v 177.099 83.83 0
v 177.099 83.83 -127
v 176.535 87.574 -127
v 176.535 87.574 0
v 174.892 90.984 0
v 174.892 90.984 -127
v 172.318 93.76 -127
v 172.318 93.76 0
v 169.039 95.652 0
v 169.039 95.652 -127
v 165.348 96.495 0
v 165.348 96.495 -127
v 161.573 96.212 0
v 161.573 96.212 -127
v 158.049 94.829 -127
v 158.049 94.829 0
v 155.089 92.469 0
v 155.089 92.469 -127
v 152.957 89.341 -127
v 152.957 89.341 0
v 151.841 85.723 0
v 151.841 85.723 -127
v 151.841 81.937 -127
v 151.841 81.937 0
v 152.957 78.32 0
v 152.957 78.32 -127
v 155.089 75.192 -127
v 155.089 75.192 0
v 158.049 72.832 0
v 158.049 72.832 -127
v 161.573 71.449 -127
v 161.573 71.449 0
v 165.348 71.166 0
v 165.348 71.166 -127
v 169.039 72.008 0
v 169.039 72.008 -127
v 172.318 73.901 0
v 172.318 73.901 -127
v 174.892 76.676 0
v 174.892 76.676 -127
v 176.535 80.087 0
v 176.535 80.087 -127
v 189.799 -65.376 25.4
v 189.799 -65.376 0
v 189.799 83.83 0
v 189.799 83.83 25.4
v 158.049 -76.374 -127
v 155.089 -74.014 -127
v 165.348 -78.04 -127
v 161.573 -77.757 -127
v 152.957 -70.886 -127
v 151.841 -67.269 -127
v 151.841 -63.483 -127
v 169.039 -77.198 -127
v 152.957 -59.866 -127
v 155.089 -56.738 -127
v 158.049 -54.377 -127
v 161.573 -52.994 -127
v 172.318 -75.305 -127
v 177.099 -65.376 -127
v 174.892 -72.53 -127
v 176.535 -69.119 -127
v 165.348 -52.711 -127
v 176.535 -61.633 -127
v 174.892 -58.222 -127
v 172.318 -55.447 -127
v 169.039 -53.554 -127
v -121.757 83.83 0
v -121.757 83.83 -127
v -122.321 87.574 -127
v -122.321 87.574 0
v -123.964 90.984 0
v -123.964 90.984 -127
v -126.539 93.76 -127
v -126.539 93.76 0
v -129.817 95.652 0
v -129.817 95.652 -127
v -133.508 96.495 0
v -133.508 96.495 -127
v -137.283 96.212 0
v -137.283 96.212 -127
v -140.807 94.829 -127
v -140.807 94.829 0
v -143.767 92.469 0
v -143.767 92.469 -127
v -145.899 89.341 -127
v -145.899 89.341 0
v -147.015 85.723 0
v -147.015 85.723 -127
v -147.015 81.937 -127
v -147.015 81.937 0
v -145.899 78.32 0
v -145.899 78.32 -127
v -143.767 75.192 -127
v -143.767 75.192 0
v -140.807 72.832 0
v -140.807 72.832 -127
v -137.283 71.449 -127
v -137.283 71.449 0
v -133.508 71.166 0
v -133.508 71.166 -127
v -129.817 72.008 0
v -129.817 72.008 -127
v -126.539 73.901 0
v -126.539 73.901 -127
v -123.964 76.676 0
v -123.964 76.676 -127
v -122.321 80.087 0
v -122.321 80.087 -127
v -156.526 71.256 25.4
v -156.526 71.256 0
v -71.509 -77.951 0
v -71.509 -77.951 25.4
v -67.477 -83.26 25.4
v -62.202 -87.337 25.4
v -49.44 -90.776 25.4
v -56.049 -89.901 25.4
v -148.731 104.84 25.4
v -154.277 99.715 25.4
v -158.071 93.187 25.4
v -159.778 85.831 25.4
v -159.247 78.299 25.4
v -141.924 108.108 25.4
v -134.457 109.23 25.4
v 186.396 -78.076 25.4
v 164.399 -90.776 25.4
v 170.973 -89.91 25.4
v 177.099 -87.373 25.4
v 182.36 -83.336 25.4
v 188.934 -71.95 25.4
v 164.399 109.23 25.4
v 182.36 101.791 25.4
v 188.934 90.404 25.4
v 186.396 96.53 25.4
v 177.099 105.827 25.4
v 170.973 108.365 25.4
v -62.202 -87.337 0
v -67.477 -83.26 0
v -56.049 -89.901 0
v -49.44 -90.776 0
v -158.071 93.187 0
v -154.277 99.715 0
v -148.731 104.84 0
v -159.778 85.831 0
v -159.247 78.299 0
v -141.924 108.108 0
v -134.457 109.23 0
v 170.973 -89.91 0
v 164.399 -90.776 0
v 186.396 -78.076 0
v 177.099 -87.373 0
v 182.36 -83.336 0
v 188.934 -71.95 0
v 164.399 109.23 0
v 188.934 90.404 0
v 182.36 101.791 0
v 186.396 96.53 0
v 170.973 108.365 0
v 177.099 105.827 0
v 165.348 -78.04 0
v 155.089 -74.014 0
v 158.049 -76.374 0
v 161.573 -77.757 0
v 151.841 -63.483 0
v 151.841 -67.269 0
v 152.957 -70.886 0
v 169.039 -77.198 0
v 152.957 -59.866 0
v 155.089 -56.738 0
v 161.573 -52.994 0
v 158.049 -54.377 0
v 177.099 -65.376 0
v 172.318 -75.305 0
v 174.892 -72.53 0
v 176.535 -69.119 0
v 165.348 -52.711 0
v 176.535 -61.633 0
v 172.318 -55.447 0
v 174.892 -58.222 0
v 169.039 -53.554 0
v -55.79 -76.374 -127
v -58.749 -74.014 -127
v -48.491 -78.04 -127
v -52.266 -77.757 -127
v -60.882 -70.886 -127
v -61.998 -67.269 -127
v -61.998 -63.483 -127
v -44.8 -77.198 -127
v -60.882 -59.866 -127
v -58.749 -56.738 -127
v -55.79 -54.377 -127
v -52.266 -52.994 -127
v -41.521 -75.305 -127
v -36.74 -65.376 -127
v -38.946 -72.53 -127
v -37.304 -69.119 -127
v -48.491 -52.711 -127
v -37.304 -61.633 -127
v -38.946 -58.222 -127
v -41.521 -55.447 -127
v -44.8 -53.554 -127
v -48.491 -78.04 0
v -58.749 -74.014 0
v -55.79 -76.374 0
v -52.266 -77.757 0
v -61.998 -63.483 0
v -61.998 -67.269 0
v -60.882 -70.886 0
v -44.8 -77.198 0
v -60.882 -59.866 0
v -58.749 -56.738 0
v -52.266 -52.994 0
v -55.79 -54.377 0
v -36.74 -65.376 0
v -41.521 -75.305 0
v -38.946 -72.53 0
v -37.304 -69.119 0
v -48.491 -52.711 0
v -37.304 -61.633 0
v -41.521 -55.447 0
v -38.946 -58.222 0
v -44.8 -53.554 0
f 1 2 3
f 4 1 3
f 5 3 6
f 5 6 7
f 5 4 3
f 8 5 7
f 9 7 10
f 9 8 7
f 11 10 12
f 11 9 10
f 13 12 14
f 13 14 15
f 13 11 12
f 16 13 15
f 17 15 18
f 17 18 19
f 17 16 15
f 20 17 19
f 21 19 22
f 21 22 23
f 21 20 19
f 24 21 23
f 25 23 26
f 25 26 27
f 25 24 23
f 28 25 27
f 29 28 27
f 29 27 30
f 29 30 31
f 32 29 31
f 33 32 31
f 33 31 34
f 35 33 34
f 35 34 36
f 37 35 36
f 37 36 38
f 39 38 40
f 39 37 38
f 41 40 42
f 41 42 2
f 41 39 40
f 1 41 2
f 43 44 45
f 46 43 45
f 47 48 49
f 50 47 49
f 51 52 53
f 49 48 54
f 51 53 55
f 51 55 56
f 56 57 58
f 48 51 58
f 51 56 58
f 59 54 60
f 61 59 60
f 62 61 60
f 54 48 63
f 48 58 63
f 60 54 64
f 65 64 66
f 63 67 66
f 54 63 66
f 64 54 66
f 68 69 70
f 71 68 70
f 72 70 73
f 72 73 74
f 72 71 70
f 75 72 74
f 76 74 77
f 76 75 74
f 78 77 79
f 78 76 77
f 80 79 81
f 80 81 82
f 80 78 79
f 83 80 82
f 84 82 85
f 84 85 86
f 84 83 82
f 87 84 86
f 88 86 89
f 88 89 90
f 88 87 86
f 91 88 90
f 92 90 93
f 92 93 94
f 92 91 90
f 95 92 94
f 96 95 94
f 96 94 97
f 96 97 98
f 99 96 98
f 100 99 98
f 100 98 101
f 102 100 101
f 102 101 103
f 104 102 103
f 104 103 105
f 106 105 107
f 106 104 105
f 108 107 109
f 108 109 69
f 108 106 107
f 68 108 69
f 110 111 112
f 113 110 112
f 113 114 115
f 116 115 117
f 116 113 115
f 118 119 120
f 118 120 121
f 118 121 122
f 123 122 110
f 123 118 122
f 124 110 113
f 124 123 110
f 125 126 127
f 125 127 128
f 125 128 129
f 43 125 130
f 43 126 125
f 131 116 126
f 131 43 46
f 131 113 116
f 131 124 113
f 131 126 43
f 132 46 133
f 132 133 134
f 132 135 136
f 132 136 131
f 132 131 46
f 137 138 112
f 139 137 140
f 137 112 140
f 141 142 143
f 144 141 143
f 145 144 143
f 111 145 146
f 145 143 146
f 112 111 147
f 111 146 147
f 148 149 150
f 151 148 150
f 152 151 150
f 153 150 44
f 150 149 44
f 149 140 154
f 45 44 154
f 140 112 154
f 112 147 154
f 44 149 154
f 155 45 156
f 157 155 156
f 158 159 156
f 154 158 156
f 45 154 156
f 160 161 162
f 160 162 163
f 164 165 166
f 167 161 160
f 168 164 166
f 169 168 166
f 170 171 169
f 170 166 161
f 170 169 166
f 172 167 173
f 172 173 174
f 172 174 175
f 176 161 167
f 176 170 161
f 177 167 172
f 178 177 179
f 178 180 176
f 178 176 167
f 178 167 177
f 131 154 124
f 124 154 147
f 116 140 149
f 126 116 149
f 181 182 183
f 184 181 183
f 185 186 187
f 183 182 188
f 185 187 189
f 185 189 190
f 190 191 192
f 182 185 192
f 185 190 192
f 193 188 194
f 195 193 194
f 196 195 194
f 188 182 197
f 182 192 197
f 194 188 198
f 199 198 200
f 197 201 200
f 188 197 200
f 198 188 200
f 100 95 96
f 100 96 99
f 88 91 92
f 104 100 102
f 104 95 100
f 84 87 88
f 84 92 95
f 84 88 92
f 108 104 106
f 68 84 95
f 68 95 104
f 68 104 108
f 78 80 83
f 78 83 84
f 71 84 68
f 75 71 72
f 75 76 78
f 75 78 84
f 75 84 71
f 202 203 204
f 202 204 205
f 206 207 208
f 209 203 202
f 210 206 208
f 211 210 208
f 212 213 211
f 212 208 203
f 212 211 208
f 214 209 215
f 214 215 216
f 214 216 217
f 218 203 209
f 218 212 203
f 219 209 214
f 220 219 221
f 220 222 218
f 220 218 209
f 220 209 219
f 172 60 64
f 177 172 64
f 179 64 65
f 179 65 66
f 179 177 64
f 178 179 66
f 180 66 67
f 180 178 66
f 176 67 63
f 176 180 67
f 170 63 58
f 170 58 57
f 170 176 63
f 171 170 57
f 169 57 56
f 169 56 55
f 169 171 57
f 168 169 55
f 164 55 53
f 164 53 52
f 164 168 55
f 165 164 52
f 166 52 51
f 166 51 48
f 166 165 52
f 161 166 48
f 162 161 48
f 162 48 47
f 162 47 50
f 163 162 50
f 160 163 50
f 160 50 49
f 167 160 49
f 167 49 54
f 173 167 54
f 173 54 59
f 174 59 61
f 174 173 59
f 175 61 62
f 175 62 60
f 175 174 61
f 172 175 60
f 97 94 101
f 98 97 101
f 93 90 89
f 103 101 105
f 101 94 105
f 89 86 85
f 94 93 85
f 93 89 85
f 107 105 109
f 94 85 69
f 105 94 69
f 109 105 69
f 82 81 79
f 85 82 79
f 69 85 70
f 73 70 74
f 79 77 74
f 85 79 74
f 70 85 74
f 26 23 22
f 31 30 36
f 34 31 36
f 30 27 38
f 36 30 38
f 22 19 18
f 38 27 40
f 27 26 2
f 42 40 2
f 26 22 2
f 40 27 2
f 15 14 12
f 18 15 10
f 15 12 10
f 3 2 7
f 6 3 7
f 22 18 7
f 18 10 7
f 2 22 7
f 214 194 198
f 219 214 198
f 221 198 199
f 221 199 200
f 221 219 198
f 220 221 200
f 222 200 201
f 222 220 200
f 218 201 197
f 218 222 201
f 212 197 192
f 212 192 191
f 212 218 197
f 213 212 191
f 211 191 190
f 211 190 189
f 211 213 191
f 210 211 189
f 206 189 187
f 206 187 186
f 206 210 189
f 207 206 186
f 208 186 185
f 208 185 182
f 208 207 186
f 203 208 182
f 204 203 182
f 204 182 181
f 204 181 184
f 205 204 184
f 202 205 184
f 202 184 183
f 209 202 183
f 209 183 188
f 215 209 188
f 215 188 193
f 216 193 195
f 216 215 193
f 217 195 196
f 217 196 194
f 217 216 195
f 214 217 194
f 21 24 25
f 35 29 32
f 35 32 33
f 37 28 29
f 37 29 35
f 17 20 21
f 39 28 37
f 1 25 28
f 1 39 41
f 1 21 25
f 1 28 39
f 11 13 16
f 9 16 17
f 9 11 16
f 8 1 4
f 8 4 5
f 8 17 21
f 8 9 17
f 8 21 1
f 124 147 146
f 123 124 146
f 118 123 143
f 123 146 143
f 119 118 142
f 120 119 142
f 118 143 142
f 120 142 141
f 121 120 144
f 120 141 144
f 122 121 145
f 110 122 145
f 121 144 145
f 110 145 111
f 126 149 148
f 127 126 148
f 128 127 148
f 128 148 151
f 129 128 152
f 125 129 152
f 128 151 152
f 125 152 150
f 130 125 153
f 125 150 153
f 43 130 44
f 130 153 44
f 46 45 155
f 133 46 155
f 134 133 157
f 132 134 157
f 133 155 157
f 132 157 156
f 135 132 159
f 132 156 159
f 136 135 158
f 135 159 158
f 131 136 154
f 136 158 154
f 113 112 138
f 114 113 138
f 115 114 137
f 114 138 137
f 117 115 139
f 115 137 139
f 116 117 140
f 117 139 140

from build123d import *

# Parameters (mm, degrees)
F0_R     = 12.7
F1_DEPTH = 127
F2_DEPTH = 127
F3_DEPTH = 127
F4_DEPTH = 127
F5_DEPTH = 25.4


with BuildPart() as f1:
    # F0 (on Top) → F1 (new body)
    with BuildSketch(Plane.XY):
        with Locations((-134.45683, 83.830311)):
            Circle(F0_R)
    extrude(amount=-F1_DEPTH)


with BuildPart() as f2:
    # F0 (on Top) → F2 (new body)
    with BuildSketch(Plane.XY):
        with Locations((-49.43966, -65.375908)):
            Circle(F0_R)
    extrude(amount=-F2_DEPTH)


with BuildPart() as f3:
    # F0 (on Top) → F3 (new body)
    with BuildSketch(Plane.XY):
        with Locations((164.399237, -65.375908)):
            Circle(F0_R)
    extrude(amount=-F3_DEPTH)


with BuildPart() as f4:
    # F0 (on Top) → F4 (new body)
    with BuildSketch(Plane.XY):
        with Locations((164.399237, 83.830311)):
            Circle(F0_R)
    extrude(amount=-F4_DEPTH)


with BuildPart() as f5:
    # F0 (on Top) → F5 (new body)
    with BuildSketch(Plane.XY):
        with BuildLine():
            Line((164.399237, 109.230311), (-134.45683, 109.230311))
            ThreePointArc((-134.45683, 109.230311), (-156.417694, 96.592774), (-156.525705, 71.255545))
            Line((-156.525705, 71.255545), (-71.508535, -77.950675))
            ThreePointArc((-71.508535, -77.950675), (-62.202123, -87.336772), (-49.43966, -90.775908))
            Line((-49.43966, -90.775908), (164.399237, -90.775908))
            ThreePointArc((164.399237, -90.775908), (182.35975, -83.336421), (189.799237, -65.375908))
            Line((189.799237, -65.375908), (189.799237, 83.830311))
            ThreePointArc((189.799237, 83.830311), (182.35975, 101.790823), (164.399237, 109.230311))
        make_face()
        with Locations((-49.43966, -65.375908)):
            Circle(F0_R, mode=Mode.SUBTRACT)
        with Locations((164.399237, -65.375908)):
            Circle(F0_R, mode=Mode.SUBTRACT)
        with Locations((-134.45683, 83.830311)):
            Circle(F0_R, mode=Mode.SUBTRACT)
        with Locations((164.399237, 83.830311)):
            Circle(F0_R, mode=Mode.SUBTRACT)
        with Locations((-49.43966, -65.375908)):
            Circle(F0_R)
        with Locations((-134.45683, 83.830311)):
            Circle(F0_R)
        with Locations((164.399237, 83.830311)):
            Circle(F0_R)
        with Locations((164.399237, -65.375908)):
            Circle(F0_R)
    extrude(amount=F5_DEPTH)


solid = Compound([f1.part, f2.part, f3.part, f4.part, f5.part])
